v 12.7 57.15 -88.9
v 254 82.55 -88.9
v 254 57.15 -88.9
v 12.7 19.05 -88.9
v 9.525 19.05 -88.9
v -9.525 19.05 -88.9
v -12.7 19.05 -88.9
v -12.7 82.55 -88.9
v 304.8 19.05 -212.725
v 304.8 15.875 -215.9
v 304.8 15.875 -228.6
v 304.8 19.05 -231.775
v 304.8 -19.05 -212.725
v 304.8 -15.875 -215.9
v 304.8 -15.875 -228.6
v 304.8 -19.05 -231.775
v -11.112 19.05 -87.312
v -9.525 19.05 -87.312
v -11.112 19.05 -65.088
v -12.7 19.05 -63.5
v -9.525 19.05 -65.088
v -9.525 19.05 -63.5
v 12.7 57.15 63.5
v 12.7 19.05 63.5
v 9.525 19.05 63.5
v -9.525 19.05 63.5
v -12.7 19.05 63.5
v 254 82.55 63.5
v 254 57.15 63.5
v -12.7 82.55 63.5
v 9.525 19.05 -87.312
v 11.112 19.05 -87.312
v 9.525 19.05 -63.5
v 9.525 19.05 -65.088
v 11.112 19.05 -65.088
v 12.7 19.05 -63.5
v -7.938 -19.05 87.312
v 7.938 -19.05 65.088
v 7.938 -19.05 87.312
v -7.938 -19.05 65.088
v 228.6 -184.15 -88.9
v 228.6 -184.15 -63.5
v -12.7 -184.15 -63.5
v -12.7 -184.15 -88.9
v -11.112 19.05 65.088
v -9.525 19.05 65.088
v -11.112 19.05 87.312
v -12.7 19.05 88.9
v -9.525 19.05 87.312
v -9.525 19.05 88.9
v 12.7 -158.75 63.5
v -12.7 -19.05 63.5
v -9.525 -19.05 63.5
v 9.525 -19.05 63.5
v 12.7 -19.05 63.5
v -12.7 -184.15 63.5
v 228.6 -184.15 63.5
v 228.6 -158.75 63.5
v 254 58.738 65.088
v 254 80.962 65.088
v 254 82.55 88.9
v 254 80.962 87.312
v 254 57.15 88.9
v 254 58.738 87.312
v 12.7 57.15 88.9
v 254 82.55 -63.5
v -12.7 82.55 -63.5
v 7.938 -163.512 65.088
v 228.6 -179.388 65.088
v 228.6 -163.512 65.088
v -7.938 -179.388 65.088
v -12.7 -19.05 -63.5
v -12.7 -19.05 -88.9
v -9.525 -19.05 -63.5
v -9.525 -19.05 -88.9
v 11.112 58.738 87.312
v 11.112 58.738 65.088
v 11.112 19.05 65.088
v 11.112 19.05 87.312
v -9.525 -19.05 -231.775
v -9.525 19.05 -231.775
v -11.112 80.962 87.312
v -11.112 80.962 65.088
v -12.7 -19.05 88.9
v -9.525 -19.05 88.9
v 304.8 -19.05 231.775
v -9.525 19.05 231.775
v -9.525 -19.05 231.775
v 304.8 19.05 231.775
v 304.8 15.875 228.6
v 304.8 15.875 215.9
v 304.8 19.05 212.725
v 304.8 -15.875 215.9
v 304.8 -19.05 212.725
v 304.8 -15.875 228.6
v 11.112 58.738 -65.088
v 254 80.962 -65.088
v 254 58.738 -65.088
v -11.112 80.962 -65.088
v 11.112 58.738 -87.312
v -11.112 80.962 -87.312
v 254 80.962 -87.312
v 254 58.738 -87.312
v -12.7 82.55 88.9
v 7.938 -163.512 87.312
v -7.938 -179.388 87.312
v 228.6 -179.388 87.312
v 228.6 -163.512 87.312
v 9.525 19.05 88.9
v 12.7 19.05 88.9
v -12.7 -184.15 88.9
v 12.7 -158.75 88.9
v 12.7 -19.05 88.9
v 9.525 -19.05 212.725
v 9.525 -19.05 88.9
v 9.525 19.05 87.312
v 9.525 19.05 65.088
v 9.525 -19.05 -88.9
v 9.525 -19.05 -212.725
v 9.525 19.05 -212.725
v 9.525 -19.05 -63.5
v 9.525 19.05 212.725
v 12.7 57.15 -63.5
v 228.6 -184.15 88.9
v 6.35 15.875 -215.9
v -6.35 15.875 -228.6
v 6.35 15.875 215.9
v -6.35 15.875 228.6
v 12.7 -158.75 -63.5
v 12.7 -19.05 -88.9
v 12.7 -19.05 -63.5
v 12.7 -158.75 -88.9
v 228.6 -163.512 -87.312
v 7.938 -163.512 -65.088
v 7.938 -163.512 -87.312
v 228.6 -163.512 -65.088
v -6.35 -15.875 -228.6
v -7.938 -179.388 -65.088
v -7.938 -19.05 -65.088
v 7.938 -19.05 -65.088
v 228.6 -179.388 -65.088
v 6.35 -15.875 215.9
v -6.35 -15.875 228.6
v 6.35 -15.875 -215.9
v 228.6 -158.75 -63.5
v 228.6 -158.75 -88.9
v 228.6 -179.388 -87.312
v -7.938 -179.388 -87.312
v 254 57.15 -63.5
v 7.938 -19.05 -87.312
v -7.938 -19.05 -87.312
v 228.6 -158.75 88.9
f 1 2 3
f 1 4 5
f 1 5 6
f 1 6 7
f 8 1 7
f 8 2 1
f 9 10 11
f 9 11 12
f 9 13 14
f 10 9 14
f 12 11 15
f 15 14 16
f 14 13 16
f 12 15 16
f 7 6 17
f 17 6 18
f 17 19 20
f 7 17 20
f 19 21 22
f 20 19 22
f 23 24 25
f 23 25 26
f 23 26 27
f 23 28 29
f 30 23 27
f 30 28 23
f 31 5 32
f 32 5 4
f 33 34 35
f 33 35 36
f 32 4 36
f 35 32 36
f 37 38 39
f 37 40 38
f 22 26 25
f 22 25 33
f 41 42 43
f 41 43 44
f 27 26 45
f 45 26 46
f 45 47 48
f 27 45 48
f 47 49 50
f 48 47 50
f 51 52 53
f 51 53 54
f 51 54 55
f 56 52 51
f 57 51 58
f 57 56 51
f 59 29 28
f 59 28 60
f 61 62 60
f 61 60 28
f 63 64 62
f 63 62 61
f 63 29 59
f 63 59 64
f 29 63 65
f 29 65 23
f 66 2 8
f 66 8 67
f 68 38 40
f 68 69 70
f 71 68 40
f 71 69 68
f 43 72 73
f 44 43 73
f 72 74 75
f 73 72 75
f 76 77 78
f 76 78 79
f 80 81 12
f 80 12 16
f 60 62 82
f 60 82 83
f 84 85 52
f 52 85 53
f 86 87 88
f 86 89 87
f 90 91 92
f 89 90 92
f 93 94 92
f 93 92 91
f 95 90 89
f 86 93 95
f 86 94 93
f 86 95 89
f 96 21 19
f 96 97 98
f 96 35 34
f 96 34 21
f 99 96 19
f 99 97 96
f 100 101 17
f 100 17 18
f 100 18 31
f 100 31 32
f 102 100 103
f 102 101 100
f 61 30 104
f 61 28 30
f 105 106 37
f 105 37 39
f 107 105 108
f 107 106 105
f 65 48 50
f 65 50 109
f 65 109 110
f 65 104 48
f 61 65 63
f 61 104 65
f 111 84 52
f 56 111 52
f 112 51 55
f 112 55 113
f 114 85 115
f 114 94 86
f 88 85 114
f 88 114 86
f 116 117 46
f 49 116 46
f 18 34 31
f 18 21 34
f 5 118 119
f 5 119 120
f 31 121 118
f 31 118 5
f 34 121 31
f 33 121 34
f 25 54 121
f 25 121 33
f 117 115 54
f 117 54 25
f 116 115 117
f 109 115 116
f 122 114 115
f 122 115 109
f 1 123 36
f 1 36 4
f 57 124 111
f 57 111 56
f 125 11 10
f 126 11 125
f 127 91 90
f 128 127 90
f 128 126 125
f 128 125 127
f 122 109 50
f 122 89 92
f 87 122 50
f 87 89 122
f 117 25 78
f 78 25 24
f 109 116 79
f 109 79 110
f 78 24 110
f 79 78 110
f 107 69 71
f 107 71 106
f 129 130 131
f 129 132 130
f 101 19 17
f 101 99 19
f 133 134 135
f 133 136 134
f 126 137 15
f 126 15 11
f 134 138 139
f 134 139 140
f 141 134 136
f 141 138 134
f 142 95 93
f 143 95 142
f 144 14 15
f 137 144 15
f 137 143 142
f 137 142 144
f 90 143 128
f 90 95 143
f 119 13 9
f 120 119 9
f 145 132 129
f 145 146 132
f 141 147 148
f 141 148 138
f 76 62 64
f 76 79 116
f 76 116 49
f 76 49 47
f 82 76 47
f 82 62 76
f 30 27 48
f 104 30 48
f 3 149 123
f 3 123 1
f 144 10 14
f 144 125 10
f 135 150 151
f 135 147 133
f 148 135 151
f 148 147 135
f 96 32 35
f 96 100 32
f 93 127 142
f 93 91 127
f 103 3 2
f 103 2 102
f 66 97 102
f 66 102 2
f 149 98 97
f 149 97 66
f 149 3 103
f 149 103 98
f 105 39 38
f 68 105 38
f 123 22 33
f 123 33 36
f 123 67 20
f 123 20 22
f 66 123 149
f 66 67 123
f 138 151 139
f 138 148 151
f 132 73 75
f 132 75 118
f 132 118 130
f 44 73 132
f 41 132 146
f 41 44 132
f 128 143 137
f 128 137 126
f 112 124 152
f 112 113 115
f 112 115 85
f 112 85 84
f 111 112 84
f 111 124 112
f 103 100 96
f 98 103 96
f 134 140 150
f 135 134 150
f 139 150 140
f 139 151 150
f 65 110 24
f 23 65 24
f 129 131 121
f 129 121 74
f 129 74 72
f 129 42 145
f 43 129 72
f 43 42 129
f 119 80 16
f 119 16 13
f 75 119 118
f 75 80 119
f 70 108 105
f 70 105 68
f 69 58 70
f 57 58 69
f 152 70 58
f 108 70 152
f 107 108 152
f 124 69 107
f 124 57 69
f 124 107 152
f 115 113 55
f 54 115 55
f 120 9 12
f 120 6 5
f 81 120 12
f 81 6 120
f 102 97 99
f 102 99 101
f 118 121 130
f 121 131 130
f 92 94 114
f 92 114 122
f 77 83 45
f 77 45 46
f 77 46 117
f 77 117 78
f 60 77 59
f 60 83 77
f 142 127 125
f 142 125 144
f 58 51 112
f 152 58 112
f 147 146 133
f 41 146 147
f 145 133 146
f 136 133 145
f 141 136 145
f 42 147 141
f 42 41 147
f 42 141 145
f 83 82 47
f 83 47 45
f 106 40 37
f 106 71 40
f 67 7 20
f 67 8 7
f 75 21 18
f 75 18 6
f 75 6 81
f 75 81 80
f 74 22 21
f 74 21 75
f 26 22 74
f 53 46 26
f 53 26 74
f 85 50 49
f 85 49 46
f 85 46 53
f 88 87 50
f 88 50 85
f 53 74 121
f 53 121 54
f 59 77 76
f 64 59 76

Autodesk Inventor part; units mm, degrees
sketch "Sketch10" plane through (0, 0, 0) normal (0, 1, 0) x (-1, 0, 0)
  line L0 (0, 0) -> (0, 222.25)
  line L1 (0, 222.25) -> (-304.8, 222.25)
  line L2 (0, 0) -> (-304.8, 0) construction
  line L3 (0, 0) -> (0, -222.25)
  line L4 (0, -222.25) -> (-304.8, -222.25)
  dimension "d31" = 222.25
  dimension "d32" = 304.8
ref_plane "Work Plane2" through (304.8, 0, 0) normal (1, 0, 0) x (0, 1, 0)
sketch "Sketch11" plane through (304.8, 0, 0) normal (1, 0, 0) x (0, 1, 0)
  line L0 (-19.05, 231.775) -> (-19.05, 212.725)
  line L1 (-19.05, 212.725) -> (19.05, 212.725)
  line L2 (19.05, 212.725) -> (19.05, 231.775)
  line L3 (19.05, 231.775) -> (-19.05, 231.775)
  line L4 (-19.05, 231.775) -> (19.05, 212.725) construction
  line L5 (-19.05, 212.725) -> (19.05, 231.775) construction
  line L6 (-15.875, 228.6) -> (-15.875, 215.9)
  line L7 (-15.875, 215.9) -> (15.875, 215.9)
  line L8 (15.875, 215.9) -> (15.875, 228.6)
  line L9 (15.875, 228.6) -> (-15.875, 228.6)
  line L10 (-15.875, 228.6) -> (15.875, 215.9) construction
  line L11 (-15.875, 215.9) -> (15.875, 228.6) construction
  point P0 (0, 0)
  point P1 (0, 222.25)
  dimension "d34" = 222.25
  dimension "d35" = 19.05
  dimension "d36" = 38.1
  dimension "d37" = 3.175
  dimension "d38" = 3.175
sweep "Sweep5" add profiles "Sketch11" path "Sketch10"
sketch "Sketch12" plane through (304.8, 19.05, 231.775) normal (0, 1, 0) x (1, 0, 0)
  line L0 (-304.8, 231.775) -> (-304.8, 0) construction
  line L1 (0, 0) -> (-314.325, 0) construction
  line L2 (-317.5, 142.875) -> (-292.1, 142.875)
  line L3 (-292.1, 142.875) -> (-292.1, 168.275)
  line L4 (-292.1, 168.275) -> (-317.5, 168.275)
  line L5 (-317.5, 168.275) -> (-317.5, 142.875)
  line L6 (-317.5, 142.875) -> (-292.1, 168.275) construction
  line L7 (-292.1, 142.875) -> (-317.5, 168.275) construction
  line L8 (-298.45, 15.875) -> (-298.45, 447.675) projected
  line L9 (-315.9125, 144.4625) -> (-293.6875, 144.4625)
  line L10 (-293.6875, 144.4625) -> (-293.6875, 166.6875)
  line L11 (-293.6875, 166.6875) -> (-315.9125, 166.6875)
  line L12 (-315.9125, 166.6875) -> (-315.9125, 144.4625)
  line L13 (-315.9125, 144.4625) -> (-293.6875, 166.6875) construction
  line L14 (-293.6875, 144.4625) -> (-315.9125, 166.6875) construction
  point P0 (-304.8, 155.575)
  dimension "d41" = 25.4
  dimension "d42" = 25.4
  dimension "d43" = 76.2
  dimension "d44" = 1.5875
  dimension "d45" = 1.5875
ref_plane "Work Plane3" through (0, 0, 50.8) normal (0, 0, 1) x (1, 0, 0)
sketch "Sketch13" plane through (0, 0, 50.8) normal (0, 0, 1) x (1, 0, 0)
  line L0 (304.8, 19.05) -> (-9.525, 19.05) projected
  line L1 (0, 19.05) -> (0, 69.85)
  line L2 (0, 69.85) -> (254, 69.85)
  point P0 (0, 0)
  dimension "d47" = 254
  dimension "d48" = 50.8
sweep "Sweep6" add profiles "Sketch12" path "Sketch13" path curves L1 L2 contours L5 L4 L8 L11 L12 L9 L2 | L8 L9 L10 L11 L4 L3 L2
mirror "Mirror2" about plane through (0, 0, 0) normal (0, 0, 1) of "Sweep6"
sketch "Sketch14" plane through (304.8, -19.05, 212.725) normal (0, -1, 0) x (1, 0, 0)
  line L0 (-304.8, -212.725) -> (-304.8, 15.875) construction
  line L1 (0, 15.875) -> (-311.15, 15.875) construction
  line L2 (-317.5, -123.825) -> (-317.5, -149.225)
  line L3 (-317.5, -149.225) -> (-292.1, -149.225)
  line L4 (-292.1, -149.225) -> (-292.1, -123.825)
  line L5 (-292.1, -123.825) -> (-317.5, -123.825)
  line L6 (-317.5, -123.825) -> (-292.1, -149.225) construction
  line L7 (-317.5, -149.225) -> (-292.1, -123.825) construction
  line L8 (-312.7375, -125.4125) -> (-312.7375, -147.6375)
  line L9 (-312.7375, -147.6375) -> (-296.8625, -147.6375)
  line L10 (-296.8625, -147.6375) -> (-296.8625, -125.4125)
  line L11 (-296.8625, -125.4125) -> (-312.7375, -125.4125)
  line L12 (-312.7375, -125.4125) -> (-296.8625, -147.6375) construction
  line L13 (-312.7375, -147.6375) -> (-296.8625, -125.4125) construction
  line L14 (-314.325, 19.05) -> (-314.325, -444.5) projected
  point P0 (-304.8, -136.525)
  dimension "d52" = 76.2
  dimension "d53" = 25.4
  dimension "d54" = 25.4
  dimension "d55" = 1.5875
  dimension "d56" = 1.5875
ref_plane "Work Plane5" through (0, 0, 76.2) normal (0, 0, 1) x (1, 0, 0)
sketch "Sketch15" plane through (0, 0, 76.2) normal (0, 0, 1) x (1, 0, 0)
  line L0 (-9.525, -19.05) -> (304.8, -19.05) projected
  line L1 (0, -19.05) -> (0, -171.45)
  line L2 (0, -171.45) -> (228.6, -171.45)
  point P0 (0, 0)
  dimension "d58" = 228.6
  dimension "d59" = 152.4
sweep "Sweep7" add profiles "Sketch14" path "Sketch15" path curves L1 L2
mirror "Mirror5" about plane through (0, 0, 0) normal (0, 0, 1) of "Sweep7"
ref_plane "Work Plane6" through (152.4, 0, 0) normal (1, 0, 0) x (0, 1, 0)
equation "\"d31\" = halfOfWidth"
equation "\"d32\" = length"
equation "\"d34\" = halfOfWidth"
equation "\"d35\" = largeTubingWidth"
equation "\"d36\" = largeTubingHeight"
equation "\"d37\" = largeTubeThickness"
equation "\"d38\" = largeTubeThickness"
equation "\"d41\" = smallSupportTubeWidth"
equation "\"d42\" = smallSupportTubeWidth"
equation "\"d43\" = distaceToMiddleSmallSupportTube"
equation "\"d44\" = smallSupportTubeThickness"
equation "\"d45\" = smallSupportTubeThickness"
equation "\"d47\" = topSupportTubeExtension"
equation "\"d48\" = smallSupportTubeLength"
equation "\"d52\" = distaceToMiddleSmallSupportTube"
equation "\"d53\" = smallSupportTubeWidth"
equation "\"d54\" = smallSupportTubeHeight"
equation "\"d55\" = smallSupportTubeThickness"
equation "\"d56\" = smallSupportTubeThickness"
equation "\"d58\" = bottomSupportTubeExtension"
equation "\"halfOfWidth\" = 0.5 * width"
equation "\"length\" = 304.8"
equation "\"height\" = 241.3"
equation "\"largeTubingWidth\" = 19.05"
equation "\"largeTubingHeight\" = 38.1"
equation "\"largeTubeThickness\" = 3.175"
equation "\"d33\" = length"
equation "\"width\" = 444.5"
equation "\"smallSupportTubeWidth\" = 25.4"
equation "\"smallSupportTubeHeight\" = 25.4"
equation "\"smallSupportTubeThickness\" = 1.5875"
equation "\"distaceToMiddleSmallSupportTube\" = 76.2"
equation "\"smallSupportTubeLength\" = 50.8"
equation "\"d46\" = smallSupportTubeLength"
equation "\"d57\" = distaceToMiddleSmallSupportTube"
equation "\"distanceOriginToPlaneForSupportTubes\" = 152.4"
equation "\"d62\" = distanceOriginToPlaneForSupportTubes"
equation "\"topSupportTubeExtension\" = 254"
equation "\"bottomSupportTubeExtension\" = 228.6"
properties part number "ShooterFrameV03"
